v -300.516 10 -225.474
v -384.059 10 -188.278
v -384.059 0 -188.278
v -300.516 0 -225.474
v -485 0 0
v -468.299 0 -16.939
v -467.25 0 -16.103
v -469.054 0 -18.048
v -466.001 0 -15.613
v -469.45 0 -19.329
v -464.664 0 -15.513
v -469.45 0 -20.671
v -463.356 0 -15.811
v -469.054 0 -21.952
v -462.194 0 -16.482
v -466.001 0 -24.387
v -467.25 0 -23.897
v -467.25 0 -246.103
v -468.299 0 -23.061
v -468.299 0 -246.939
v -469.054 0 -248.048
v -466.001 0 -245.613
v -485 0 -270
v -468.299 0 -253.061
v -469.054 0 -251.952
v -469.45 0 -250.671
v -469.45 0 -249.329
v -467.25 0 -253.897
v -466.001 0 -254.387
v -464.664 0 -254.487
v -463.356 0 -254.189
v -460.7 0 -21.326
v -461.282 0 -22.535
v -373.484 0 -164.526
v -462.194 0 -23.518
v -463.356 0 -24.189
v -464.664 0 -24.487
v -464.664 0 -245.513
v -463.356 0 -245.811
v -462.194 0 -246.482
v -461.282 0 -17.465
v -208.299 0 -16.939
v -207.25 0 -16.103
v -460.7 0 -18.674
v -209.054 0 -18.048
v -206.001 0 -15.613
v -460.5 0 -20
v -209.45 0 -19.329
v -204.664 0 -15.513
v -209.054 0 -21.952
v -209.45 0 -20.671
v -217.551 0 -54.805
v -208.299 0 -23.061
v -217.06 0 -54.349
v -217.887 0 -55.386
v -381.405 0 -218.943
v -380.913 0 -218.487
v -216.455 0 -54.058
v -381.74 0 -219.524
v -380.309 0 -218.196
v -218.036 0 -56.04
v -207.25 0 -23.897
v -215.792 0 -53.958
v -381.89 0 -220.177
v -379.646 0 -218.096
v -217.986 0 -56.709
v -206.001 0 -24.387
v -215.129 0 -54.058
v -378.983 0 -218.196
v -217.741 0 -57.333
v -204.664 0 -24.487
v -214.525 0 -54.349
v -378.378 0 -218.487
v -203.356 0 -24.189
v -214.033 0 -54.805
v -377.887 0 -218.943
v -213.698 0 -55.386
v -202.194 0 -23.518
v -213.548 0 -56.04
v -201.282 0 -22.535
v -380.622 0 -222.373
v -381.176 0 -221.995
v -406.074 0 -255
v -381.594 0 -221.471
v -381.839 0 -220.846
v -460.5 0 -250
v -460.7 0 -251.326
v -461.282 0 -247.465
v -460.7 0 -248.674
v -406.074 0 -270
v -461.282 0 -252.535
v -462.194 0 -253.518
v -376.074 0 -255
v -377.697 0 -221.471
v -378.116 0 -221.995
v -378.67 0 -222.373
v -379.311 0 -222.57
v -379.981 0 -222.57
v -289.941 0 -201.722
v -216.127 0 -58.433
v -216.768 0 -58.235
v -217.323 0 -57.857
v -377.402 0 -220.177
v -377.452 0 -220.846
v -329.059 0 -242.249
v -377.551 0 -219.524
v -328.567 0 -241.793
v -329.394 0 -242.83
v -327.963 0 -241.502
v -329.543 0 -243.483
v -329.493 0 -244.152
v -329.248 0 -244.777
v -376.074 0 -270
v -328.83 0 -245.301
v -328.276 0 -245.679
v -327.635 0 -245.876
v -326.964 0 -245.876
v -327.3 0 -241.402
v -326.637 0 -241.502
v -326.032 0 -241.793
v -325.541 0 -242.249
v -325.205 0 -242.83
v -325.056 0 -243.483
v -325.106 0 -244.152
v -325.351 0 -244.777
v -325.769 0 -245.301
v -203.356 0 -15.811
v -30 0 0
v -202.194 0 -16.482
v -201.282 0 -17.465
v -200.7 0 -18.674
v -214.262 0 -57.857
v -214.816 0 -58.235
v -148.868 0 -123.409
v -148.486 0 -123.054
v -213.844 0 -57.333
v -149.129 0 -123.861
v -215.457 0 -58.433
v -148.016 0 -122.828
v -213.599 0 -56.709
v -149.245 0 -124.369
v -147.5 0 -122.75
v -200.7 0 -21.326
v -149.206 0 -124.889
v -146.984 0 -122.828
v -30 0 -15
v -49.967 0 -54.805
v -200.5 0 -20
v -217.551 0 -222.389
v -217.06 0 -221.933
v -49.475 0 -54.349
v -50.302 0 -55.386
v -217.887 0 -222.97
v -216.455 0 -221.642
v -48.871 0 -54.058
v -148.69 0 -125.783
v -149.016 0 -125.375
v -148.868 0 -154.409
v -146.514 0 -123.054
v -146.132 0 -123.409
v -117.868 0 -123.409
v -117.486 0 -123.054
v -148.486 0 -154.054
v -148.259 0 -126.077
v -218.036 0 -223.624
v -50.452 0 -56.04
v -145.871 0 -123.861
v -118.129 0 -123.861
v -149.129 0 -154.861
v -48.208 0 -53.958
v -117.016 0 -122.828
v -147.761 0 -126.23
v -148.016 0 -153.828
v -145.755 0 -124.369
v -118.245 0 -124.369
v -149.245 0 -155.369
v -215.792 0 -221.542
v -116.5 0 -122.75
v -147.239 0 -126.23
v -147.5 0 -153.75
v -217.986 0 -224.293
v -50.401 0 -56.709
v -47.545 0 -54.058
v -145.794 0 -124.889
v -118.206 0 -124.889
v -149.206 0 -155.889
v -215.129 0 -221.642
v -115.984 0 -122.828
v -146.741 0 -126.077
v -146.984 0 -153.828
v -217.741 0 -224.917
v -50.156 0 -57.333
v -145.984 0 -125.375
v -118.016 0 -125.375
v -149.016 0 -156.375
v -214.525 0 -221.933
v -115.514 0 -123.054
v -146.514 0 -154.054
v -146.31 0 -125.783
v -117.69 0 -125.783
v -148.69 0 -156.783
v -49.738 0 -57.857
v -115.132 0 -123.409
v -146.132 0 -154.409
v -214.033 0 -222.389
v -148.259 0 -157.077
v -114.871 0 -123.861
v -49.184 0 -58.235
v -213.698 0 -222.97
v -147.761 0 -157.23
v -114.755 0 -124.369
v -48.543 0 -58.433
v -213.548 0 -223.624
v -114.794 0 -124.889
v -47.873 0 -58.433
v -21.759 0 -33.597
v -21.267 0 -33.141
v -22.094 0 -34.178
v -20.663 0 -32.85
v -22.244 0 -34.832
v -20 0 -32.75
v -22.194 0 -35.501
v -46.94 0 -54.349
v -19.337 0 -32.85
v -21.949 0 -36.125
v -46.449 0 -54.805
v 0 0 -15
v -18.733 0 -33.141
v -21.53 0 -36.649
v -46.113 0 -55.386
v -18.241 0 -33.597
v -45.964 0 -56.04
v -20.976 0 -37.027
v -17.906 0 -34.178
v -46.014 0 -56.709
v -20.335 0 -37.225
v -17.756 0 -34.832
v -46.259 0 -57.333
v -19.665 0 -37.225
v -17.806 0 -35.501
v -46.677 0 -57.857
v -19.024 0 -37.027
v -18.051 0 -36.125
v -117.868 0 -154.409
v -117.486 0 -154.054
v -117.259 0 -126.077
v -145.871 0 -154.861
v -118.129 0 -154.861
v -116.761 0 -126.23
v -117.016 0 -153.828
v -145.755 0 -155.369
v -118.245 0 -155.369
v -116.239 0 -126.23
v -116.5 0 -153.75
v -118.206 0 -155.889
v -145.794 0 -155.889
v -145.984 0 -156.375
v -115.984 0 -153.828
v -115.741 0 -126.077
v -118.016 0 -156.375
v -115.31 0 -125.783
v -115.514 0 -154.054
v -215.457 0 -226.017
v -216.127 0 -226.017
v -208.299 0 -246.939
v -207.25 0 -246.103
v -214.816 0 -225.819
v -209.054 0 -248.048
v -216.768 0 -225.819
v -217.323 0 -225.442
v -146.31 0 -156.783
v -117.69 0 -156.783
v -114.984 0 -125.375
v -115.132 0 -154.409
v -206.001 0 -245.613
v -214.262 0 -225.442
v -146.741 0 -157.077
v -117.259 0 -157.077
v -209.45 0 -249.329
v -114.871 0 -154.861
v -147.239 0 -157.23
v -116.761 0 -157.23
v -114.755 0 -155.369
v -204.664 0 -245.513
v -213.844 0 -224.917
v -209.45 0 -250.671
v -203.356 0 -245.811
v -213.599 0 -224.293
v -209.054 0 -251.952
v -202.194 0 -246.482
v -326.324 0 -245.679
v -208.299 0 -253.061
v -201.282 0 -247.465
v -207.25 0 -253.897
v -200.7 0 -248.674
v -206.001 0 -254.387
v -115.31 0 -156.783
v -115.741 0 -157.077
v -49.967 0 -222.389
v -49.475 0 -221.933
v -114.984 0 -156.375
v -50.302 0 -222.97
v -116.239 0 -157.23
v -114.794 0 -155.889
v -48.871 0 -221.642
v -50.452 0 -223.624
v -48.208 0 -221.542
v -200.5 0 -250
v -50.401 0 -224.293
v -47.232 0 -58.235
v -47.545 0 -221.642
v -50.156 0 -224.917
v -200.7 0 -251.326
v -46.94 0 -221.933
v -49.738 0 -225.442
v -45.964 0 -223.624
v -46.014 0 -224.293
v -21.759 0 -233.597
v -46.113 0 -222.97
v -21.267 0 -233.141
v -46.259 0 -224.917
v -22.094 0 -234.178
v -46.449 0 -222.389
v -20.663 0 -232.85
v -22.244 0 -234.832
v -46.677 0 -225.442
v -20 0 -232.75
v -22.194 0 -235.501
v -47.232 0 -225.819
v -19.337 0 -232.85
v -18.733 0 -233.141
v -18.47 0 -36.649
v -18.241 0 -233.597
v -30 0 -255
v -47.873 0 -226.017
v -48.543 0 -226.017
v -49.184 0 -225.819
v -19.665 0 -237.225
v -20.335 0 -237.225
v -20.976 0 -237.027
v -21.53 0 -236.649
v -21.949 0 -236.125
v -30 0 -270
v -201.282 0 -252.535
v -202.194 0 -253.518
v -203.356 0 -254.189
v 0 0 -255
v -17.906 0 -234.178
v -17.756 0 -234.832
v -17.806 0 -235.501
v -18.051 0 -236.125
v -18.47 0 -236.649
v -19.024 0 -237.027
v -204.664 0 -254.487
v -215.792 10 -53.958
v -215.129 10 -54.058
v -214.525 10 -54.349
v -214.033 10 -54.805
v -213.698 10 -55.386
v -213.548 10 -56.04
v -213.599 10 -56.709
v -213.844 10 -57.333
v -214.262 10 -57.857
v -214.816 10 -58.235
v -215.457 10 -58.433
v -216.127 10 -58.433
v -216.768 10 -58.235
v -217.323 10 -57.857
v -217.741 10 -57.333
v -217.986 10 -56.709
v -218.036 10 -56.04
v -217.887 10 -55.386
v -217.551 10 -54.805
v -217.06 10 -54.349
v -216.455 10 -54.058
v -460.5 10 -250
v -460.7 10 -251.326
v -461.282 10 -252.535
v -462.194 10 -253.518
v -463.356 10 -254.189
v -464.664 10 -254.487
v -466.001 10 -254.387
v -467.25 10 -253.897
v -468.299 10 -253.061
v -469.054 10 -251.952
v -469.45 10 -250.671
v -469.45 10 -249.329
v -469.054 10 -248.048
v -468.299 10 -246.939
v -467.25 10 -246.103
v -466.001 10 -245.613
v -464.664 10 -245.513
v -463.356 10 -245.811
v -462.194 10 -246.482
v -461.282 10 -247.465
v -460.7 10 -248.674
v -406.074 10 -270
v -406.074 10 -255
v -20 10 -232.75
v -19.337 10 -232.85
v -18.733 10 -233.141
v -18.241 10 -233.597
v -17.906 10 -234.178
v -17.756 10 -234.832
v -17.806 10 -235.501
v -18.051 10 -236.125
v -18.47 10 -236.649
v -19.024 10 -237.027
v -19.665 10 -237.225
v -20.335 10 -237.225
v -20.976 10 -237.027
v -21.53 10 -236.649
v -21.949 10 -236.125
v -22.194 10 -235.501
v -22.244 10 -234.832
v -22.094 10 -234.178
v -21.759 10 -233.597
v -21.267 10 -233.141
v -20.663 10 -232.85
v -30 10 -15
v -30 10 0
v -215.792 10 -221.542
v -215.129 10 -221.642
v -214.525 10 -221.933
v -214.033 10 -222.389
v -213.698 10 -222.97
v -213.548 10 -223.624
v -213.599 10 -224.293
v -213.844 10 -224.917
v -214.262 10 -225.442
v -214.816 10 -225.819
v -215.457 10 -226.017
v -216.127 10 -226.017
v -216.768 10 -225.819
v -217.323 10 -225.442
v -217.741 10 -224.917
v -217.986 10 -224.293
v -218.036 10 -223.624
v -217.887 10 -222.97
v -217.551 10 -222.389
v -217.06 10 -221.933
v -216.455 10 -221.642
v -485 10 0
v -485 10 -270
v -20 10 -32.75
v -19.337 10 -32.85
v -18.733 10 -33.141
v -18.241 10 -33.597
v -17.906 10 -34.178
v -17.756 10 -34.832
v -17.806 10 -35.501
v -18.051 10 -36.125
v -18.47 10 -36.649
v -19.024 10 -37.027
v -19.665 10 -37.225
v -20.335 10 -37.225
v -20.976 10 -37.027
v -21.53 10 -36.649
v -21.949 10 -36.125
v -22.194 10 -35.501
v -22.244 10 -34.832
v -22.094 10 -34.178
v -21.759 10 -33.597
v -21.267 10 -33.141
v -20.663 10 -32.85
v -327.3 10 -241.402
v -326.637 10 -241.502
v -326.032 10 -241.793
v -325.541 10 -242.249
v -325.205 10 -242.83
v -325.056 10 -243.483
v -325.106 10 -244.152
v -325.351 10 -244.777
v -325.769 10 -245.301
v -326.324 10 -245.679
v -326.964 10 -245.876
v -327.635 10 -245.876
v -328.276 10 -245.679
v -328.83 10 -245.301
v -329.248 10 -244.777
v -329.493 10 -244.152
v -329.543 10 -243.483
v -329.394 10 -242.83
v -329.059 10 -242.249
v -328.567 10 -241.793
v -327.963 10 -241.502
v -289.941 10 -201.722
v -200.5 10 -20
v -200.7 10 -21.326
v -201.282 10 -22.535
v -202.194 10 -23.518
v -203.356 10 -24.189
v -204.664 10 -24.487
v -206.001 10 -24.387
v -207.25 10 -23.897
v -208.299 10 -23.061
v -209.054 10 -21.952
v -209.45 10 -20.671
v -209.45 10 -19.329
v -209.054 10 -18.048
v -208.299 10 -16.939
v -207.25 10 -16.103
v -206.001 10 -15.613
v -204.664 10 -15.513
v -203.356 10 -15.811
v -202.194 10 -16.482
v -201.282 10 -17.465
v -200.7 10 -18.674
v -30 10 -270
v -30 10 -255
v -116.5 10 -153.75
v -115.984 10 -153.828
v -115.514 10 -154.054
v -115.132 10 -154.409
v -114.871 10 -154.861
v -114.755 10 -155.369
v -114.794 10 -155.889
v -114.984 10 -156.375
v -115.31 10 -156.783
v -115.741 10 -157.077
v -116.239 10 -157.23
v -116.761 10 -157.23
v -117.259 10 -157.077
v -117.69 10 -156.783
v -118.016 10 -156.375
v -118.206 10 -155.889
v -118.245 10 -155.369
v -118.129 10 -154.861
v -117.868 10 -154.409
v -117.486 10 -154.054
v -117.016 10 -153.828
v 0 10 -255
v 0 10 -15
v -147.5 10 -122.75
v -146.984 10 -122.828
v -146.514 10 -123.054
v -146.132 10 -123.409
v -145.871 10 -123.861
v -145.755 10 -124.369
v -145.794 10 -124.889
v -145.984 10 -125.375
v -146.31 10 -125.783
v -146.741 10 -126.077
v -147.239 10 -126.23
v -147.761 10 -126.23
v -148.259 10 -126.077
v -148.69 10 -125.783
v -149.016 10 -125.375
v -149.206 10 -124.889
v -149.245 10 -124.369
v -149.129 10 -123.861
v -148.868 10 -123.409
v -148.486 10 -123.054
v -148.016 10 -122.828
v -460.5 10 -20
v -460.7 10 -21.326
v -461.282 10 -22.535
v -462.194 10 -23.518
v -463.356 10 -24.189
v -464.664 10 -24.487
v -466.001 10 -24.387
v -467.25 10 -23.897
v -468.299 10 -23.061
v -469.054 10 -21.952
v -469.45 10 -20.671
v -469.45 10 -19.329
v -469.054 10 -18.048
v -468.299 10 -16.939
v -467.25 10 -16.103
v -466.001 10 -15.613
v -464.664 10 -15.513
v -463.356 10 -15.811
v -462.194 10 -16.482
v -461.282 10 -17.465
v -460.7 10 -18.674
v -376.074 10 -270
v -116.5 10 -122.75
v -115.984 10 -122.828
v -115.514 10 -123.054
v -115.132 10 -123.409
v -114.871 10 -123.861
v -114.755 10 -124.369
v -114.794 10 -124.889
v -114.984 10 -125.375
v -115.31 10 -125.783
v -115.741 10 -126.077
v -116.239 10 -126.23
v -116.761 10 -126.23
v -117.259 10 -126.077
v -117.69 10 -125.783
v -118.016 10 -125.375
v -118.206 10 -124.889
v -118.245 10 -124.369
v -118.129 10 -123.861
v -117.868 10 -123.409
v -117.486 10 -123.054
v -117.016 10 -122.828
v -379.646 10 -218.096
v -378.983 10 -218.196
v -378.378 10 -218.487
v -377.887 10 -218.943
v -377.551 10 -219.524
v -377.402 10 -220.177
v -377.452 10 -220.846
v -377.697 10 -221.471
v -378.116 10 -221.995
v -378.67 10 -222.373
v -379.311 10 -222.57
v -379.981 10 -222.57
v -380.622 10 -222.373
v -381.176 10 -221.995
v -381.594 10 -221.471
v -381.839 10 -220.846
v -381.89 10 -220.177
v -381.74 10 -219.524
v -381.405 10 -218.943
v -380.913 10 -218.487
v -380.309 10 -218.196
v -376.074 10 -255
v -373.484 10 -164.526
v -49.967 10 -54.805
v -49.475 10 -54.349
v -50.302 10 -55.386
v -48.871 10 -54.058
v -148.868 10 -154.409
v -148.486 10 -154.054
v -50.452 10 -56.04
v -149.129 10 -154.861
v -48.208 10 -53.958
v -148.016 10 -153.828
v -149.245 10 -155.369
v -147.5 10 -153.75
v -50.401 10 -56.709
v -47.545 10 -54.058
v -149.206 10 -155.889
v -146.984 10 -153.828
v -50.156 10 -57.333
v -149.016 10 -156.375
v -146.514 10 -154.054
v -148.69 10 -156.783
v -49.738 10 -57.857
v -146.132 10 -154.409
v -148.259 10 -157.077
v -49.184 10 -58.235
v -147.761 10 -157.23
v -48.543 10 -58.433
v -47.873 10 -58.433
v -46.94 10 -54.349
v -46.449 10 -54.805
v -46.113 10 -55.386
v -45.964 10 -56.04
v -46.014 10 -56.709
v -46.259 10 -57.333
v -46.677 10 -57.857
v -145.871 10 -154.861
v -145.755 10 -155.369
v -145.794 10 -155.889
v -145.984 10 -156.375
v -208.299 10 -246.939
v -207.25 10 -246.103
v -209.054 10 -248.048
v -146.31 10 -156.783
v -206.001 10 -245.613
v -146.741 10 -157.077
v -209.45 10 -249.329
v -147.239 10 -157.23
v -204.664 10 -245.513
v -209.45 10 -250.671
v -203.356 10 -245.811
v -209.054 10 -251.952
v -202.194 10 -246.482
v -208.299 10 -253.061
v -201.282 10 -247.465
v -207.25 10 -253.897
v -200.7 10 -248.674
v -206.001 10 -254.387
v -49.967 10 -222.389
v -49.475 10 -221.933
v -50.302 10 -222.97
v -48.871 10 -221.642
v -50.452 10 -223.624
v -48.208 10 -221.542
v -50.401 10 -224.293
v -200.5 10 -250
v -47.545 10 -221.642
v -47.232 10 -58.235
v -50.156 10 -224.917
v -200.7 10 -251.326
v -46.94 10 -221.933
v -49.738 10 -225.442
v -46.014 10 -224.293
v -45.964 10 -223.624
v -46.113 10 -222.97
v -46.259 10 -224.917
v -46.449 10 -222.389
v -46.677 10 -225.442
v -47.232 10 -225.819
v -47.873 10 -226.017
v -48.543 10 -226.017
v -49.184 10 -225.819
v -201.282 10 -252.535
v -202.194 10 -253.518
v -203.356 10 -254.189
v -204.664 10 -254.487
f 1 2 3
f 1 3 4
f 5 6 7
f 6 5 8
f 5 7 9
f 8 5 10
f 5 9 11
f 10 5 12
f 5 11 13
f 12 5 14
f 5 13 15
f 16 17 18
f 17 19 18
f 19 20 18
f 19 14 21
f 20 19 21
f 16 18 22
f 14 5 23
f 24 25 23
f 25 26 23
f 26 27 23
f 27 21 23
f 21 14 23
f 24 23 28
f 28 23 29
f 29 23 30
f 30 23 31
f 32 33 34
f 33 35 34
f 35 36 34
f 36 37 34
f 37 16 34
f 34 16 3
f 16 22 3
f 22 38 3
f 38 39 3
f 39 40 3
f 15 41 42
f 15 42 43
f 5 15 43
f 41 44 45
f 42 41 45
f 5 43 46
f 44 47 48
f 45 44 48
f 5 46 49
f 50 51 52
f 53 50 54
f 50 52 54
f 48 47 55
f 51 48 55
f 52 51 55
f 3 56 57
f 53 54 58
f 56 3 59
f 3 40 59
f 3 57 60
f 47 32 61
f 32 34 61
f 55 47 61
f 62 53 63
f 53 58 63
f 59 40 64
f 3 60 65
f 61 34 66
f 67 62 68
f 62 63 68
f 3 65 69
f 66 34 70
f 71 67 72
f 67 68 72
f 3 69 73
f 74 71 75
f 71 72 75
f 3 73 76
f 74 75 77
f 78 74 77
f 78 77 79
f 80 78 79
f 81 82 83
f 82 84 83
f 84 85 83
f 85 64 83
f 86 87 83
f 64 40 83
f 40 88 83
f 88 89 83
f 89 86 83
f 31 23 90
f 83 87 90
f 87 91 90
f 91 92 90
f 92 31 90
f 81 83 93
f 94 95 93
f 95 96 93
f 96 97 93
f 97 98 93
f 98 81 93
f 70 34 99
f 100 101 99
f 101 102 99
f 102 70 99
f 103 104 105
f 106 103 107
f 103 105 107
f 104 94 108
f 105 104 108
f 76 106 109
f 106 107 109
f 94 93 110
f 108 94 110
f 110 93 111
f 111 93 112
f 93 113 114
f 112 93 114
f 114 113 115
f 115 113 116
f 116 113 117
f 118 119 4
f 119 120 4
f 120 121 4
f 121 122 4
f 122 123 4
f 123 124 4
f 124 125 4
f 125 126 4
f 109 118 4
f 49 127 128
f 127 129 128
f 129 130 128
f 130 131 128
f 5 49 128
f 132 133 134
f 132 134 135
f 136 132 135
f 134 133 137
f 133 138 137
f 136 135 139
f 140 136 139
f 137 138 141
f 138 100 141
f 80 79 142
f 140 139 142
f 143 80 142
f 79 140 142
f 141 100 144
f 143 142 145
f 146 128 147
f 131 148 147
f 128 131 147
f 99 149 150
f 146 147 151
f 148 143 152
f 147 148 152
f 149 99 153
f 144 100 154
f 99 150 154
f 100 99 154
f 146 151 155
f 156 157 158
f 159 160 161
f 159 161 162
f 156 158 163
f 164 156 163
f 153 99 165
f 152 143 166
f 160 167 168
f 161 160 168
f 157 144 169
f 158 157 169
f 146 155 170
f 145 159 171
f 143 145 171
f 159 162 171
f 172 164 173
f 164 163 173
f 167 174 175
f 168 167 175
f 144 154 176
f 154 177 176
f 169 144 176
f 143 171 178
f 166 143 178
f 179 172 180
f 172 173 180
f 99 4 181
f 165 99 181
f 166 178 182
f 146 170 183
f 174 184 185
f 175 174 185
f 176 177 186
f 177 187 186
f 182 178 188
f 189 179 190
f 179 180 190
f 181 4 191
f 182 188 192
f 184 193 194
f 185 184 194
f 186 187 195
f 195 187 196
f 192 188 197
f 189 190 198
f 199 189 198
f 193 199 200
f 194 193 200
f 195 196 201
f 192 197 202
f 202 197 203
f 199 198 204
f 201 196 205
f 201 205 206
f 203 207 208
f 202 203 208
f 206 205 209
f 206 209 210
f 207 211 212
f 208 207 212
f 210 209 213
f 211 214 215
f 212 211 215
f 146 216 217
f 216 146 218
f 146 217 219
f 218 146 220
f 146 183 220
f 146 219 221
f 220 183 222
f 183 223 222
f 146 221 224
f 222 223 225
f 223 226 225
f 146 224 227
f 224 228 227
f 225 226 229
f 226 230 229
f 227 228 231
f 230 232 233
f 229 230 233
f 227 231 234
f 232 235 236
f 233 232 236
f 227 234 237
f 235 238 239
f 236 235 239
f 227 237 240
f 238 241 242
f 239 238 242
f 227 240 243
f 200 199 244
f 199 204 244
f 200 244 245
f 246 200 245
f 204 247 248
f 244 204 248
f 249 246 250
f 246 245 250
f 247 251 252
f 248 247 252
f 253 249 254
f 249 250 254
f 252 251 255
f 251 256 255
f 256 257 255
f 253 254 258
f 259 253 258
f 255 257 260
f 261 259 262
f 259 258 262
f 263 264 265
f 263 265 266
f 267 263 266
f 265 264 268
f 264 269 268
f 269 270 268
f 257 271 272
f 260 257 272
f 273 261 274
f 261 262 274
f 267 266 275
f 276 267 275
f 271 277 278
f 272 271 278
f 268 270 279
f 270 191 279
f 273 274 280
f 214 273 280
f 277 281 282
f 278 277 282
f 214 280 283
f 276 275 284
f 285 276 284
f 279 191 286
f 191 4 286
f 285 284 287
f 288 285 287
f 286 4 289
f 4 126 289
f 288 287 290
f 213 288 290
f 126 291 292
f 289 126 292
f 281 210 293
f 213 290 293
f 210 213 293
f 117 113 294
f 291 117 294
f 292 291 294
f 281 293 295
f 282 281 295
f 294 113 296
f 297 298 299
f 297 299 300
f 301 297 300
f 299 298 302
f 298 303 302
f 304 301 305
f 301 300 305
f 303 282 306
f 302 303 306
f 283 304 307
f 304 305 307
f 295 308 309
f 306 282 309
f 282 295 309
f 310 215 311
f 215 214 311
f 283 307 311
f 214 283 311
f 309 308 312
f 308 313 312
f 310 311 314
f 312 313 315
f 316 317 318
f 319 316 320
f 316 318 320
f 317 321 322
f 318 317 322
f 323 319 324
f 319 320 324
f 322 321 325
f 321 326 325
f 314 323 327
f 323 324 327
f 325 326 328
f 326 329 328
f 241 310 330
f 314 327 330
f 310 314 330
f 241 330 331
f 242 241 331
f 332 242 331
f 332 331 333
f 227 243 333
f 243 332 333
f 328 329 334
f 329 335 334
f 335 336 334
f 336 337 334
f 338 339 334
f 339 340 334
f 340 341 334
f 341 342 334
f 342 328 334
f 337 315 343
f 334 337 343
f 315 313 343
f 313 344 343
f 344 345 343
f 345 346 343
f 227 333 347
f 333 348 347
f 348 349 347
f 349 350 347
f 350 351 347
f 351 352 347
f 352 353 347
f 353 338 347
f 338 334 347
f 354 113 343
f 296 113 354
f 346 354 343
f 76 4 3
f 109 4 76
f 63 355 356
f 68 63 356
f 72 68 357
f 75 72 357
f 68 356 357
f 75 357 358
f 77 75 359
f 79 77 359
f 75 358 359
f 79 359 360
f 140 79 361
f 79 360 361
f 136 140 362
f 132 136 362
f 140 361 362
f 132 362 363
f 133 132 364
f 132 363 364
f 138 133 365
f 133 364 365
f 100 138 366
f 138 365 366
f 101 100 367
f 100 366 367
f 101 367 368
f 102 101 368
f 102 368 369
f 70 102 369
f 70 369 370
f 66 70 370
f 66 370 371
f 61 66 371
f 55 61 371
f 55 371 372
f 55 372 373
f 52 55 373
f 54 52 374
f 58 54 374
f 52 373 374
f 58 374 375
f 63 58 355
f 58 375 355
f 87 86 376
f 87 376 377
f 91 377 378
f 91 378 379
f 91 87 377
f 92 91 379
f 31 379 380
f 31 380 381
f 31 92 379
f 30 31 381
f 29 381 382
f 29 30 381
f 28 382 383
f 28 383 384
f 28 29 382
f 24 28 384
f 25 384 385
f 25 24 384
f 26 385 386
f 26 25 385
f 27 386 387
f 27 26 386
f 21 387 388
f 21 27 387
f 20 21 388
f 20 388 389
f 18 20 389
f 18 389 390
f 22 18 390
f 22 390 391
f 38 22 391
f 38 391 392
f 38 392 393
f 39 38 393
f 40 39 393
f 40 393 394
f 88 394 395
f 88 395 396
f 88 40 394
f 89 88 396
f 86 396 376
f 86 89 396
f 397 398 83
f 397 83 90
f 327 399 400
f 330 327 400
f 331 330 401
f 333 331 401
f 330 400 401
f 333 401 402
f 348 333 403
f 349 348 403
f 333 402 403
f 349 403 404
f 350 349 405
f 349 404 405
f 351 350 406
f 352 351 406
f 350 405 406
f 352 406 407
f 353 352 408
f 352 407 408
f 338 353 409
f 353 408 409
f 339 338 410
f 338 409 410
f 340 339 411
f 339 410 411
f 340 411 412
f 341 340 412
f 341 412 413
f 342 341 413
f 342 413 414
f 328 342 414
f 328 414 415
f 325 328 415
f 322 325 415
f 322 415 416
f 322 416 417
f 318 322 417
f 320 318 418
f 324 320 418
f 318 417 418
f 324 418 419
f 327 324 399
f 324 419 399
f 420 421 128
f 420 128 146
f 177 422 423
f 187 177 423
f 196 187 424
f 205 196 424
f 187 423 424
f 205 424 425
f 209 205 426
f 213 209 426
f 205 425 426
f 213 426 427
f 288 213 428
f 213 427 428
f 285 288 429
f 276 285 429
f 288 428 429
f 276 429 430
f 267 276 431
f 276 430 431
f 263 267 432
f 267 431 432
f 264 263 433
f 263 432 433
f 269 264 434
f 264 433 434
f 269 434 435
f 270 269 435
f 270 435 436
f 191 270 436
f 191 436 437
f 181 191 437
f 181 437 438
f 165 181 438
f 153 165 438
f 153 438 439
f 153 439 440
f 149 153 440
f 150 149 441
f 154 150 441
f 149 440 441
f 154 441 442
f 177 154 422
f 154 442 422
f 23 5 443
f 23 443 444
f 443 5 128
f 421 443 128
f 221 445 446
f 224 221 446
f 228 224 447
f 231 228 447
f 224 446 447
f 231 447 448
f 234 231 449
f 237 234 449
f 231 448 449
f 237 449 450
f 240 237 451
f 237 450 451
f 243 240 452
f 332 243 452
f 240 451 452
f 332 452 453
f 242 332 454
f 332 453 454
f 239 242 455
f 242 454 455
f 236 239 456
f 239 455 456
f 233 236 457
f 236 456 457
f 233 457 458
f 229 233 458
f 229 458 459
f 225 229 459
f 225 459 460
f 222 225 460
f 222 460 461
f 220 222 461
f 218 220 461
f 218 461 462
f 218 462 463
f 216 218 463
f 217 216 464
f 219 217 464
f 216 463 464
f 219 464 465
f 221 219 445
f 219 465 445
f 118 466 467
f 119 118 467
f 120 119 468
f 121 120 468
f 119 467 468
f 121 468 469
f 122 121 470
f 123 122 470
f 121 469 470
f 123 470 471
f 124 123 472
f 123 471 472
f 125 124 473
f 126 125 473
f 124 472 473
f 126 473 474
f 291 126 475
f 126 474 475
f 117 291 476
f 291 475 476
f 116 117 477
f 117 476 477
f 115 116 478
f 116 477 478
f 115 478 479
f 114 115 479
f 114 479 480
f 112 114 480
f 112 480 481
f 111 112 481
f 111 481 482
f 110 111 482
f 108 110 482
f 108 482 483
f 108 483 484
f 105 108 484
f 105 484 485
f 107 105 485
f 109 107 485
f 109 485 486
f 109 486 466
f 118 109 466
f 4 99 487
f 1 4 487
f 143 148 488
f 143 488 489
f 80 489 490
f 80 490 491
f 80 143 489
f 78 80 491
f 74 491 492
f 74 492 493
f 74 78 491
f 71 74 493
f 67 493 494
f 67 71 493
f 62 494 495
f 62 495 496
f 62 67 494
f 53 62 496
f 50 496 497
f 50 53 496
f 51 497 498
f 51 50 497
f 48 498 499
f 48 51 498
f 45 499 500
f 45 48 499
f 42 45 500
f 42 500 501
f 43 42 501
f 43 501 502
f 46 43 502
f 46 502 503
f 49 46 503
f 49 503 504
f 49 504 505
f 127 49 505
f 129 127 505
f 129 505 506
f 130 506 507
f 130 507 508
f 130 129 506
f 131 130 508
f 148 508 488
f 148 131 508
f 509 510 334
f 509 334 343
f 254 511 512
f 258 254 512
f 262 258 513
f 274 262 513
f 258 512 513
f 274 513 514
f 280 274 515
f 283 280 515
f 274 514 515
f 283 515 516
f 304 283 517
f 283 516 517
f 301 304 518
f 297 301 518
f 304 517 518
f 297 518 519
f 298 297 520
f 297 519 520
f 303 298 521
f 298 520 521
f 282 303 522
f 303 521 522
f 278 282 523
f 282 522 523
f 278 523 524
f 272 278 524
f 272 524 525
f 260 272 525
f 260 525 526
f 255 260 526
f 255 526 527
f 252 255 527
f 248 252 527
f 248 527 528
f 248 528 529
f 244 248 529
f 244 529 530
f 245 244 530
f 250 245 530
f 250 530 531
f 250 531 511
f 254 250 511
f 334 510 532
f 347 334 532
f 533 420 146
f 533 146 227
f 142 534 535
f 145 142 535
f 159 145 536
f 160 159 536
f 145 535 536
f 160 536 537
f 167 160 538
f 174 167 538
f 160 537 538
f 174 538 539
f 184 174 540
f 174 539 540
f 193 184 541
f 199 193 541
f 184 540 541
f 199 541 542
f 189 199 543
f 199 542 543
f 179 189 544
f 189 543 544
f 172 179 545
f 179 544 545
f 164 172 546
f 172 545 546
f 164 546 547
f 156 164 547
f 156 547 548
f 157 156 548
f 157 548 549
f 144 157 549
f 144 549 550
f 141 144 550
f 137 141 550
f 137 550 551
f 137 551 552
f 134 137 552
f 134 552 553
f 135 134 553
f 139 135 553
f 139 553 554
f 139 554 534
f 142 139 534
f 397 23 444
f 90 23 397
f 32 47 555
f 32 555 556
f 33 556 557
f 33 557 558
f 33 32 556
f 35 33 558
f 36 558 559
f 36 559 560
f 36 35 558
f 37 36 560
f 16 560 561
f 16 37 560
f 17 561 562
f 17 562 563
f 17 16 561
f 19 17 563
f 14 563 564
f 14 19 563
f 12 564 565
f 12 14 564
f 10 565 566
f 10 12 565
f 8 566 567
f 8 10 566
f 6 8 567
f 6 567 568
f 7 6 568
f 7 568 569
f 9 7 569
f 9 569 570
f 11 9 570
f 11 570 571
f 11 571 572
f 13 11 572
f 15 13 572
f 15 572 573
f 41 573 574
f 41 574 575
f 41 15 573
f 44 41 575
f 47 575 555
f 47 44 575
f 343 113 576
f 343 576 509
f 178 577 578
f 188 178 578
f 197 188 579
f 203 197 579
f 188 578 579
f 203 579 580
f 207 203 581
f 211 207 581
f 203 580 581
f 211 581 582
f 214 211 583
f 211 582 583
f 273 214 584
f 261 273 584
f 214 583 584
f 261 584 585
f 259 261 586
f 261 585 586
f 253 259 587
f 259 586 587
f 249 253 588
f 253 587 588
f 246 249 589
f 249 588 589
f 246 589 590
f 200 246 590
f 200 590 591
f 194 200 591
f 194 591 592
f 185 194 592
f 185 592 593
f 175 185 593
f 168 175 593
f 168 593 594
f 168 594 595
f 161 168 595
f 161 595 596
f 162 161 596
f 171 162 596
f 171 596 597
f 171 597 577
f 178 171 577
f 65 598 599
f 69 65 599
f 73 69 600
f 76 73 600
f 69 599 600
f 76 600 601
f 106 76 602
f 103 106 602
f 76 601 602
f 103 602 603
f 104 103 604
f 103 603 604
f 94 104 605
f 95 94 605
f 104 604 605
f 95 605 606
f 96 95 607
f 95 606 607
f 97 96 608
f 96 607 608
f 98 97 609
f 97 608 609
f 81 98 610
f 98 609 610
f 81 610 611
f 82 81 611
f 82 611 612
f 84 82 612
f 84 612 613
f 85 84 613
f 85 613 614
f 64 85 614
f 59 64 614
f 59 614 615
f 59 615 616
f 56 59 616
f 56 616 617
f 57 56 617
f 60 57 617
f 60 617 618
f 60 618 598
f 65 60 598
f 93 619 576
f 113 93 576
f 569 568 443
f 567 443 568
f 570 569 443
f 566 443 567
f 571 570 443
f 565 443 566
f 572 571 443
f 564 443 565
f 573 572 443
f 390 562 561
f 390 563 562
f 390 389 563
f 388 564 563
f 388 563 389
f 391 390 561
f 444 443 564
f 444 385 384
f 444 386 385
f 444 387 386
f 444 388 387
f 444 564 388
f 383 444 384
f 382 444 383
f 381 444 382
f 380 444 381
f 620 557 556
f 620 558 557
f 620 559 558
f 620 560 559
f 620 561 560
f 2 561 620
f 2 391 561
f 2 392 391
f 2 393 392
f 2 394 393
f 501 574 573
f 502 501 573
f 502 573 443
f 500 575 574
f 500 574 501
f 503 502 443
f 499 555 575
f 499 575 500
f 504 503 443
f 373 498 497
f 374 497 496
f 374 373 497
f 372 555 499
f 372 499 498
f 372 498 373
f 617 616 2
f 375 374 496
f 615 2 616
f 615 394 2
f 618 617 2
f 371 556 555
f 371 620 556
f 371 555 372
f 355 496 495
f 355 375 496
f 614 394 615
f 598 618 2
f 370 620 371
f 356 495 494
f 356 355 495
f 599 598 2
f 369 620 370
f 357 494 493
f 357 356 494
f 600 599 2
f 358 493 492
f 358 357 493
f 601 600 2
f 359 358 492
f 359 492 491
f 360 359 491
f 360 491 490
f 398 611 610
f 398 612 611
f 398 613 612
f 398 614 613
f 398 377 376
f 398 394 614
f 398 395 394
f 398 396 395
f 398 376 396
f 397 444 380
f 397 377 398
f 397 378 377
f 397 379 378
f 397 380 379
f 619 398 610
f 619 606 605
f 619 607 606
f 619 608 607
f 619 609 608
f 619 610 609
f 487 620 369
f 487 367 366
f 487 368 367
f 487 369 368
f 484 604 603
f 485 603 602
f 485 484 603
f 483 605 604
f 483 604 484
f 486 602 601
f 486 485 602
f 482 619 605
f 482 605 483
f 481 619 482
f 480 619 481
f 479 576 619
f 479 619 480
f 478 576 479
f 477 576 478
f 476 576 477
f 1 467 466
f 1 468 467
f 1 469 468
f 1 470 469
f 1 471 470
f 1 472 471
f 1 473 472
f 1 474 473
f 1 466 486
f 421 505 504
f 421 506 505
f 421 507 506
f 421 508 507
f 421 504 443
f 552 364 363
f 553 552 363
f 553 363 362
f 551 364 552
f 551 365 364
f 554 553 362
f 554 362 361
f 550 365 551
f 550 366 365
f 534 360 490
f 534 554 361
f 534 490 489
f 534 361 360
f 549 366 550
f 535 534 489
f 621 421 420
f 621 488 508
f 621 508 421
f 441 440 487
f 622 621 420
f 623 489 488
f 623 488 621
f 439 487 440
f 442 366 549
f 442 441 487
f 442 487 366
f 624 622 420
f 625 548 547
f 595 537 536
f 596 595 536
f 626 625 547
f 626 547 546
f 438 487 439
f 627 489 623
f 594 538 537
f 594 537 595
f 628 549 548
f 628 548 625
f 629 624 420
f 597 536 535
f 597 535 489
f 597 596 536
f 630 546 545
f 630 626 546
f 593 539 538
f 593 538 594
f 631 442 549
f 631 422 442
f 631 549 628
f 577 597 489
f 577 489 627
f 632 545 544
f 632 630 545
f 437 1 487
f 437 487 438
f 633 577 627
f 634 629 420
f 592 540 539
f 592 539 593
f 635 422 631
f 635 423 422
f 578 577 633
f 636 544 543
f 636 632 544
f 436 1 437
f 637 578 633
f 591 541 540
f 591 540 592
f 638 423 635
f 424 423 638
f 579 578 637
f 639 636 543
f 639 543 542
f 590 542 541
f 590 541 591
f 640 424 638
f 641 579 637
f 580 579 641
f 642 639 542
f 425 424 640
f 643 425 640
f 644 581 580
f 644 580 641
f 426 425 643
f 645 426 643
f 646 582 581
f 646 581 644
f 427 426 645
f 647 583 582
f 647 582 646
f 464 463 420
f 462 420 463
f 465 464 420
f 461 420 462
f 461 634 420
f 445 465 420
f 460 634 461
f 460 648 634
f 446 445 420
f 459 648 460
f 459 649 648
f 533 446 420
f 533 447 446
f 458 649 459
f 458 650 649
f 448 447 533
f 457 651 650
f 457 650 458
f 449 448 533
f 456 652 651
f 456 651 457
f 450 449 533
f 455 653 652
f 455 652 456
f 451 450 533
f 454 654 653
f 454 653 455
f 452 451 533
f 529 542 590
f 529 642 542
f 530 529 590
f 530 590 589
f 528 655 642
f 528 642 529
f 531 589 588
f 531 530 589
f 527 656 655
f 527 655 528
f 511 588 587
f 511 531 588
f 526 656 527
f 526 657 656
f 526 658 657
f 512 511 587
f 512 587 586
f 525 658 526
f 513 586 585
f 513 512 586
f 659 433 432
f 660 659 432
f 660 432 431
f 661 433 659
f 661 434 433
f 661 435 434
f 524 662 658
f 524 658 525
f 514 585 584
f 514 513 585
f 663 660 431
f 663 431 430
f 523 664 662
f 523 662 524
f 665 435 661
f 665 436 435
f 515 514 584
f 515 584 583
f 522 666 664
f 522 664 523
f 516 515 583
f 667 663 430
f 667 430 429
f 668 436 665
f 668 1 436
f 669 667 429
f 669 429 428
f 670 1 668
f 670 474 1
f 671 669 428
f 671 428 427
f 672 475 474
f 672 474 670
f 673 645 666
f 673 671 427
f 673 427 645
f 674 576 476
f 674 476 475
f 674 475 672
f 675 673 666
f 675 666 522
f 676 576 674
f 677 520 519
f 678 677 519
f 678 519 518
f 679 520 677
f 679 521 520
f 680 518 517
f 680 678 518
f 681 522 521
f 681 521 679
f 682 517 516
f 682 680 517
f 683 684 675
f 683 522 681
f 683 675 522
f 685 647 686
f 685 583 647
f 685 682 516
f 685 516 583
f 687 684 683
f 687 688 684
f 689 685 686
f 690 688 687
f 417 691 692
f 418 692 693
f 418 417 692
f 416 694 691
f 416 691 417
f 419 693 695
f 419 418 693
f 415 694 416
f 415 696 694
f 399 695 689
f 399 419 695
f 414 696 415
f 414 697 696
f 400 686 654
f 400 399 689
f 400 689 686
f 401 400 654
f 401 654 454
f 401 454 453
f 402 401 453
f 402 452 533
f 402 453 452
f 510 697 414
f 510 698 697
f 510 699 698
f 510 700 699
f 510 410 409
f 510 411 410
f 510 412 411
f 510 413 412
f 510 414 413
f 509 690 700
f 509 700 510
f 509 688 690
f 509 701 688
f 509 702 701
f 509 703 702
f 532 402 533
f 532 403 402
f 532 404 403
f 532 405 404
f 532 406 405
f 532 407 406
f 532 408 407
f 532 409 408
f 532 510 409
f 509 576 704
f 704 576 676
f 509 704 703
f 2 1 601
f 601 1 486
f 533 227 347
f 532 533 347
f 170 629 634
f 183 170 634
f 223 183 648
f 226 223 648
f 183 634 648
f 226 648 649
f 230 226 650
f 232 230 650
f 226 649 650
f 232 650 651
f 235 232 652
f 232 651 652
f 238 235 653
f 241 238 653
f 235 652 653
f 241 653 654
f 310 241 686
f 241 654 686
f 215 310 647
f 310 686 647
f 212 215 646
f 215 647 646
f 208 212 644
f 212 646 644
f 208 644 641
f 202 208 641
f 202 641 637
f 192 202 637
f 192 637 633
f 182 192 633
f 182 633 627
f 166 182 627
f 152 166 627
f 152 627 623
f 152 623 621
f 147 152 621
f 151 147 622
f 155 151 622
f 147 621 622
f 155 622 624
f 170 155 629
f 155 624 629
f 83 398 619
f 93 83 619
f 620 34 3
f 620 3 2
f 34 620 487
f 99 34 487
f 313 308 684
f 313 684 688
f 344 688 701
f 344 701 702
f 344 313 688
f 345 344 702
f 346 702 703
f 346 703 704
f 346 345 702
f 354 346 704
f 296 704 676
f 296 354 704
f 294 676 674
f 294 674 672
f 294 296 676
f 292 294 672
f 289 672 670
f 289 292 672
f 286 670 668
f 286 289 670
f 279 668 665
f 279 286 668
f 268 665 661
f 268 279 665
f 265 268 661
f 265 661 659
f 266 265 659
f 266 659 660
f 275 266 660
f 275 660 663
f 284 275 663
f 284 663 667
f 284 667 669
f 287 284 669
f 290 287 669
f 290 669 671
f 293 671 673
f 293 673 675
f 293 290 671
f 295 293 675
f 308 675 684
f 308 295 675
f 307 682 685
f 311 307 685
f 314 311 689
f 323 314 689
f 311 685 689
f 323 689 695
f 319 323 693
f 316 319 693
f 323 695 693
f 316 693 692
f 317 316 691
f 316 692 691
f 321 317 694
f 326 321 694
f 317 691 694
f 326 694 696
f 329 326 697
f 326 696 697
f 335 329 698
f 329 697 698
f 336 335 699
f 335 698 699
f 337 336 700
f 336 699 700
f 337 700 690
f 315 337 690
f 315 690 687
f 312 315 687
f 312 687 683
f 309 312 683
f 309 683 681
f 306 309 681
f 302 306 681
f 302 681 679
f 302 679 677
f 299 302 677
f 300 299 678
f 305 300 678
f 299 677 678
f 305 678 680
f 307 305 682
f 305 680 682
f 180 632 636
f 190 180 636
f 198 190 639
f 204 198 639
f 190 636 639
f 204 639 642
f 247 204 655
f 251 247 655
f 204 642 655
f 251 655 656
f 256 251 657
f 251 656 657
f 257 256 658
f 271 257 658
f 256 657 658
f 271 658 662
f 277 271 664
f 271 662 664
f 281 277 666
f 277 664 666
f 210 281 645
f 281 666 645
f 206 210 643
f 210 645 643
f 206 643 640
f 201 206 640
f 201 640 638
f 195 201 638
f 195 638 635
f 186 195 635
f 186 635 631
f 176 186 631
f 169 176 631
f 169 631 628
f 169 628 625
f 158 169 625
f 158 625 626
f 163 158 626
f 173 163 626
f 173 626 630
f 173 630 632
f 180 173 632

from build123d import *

# Parameters (mm, degrees)
SCHIZZO1_W                    = 485
SCHIZZO1_H                    = 270
ESTRUSIONE_ESTRUSIONE1_DEPTH  = 10
FORO_PER_VITE_M8_1_OUTLINE_R  = 4.5
FORO_PER_VITE_M8_1_DEPTH      = 10
TAGLIO_ESTRUSIONE1_DEPTH      = 13
TAGLIO_ESTRUSIONE1_DEPTH_BACK = 13
SCHIZZO5_W                    = 91.448812178
SCHIZZO5_H                    = 10
SCHIZZO6_R                    = 2.25
TAGLIO_ESTRUSIONE2_DEPTH      = 10
SCHIZZO7_R                    = 1.75
TAGLIO_ESTRUSIONE3_DEPTH      = 15
SCHIZZO8_R                    = 2.25
TAGLIO_ESTRUSIONE4_DEPTH      = 42.3
SCHIZZO9_W                    = 30
SCHIZZO9_H                    = 15
TAGLIO_ESTRUSIONE5_DEPTH      = 10
SCHIZZO10_R                   = 2.25
TAGLIO_ESTRUSIONE6_DEPTH      = 10


# Read off the part's stored shape, not the designer's step: Foro per Vite M8-1
with BuildPart() as part:
    # Schizzo1 → Estrusione-Estrusione1 (new body)
    with BuildSketch(Plane(origin=(0, 0, 0), x_dir=(1, 0, 0), z_dir=(0, 1, 0))):
        with Locations((-242.5, 135)):
            Rectangle(SCHIZZO1_W, SCHIZZO1_H)
    extrude(amount=ESTRUSIONE_ESTRUSIONE1_DEPTH)

    # Foro per Vite M8-1 outline → Foro per Vite M8-1 (cut)
    with BuildSketch(Plane(origin=(0, 0, 0), x_dir=(1, 0, 0), z_dir=(0, 1, 0))):
        with Locations((-205, 250)):
            Circle(FORO_PER_VITE_M8_1_OUTLINE_R)
        with Locations((-465, 20)):
            Circle(FORO_PER_VITE_M8_1_OUTLINE_R)
        with Locations((-205, 20)):
            Circle(FORO_PER_VITE_M8_1_OUTLINE_R)
        with Locations((-465, 250)):
            Circle(FORO_PER_VITE_M8_1_OUTLINE_R)
    extrude(amount=FORO_PER_VITE_M8_1_DEPTH, mode=Mode.SUBTRACT)

    # Schizzo5 → Taglio-Estrusione1 (cut, two sides: drawn at the far end of the back side and taken through both)
    with BuildSketch(Plane(origin=(-128.208113313, 0, -287.960137213), x_dir=(0.9135454576425992, 0, -0.4067366430758042), z_dir=(0.4067366430758042, 0, 0.9135454576425992)).offset(-TAGLIO_ESTRUSIONE1_DEPTH_BACK)):
        with Locations((-228.551173826, 5)):
            Rectangle(SCHIZZO5_W, SCHIZZO5_H)
    extrude(amount=TAGLIO_ESTRUSIONE1_DEPTH + TAGLIO_ESTRUSIONE1_DEPTH_BACK, mode=Mode.SUBTRACT)

    # Schizzo6 → Taglio-Estrusione2 (cut)
    with BuildSketch(Plane(origin=(0, 10, 0), x_dir=(1, 0, 0), z_dir=(0, 1, 0))):
        with Locations(Location((-48.207846429, 223.792153571, 0), (0, 0, 270))):
            Circle(SCHIZZO6_R)
        with Locations(Location((-215.792153571, 223.792153571, 0), (0, 0, 270))):
            Circle(SCHIZZO6_R)
        with Locations(Location((-215.792153571, 56.207846429, 0), (0, 0, 270))):
            Circle(SCHIZZO6_R)
        with Locations(Location((-48.207846429, 56.207846429, 0), (0, 0, 270))):
            Circle(SCHIZZO6_R)
    extrude(amount=-TAGLIO_ESTRUSIONE2_DEPTH, mode=Mode.SUBTRACT)

    # Schizzo7 → Taglio-Estrusione3 (cut)
    with BuildSketch(Plane(origin=(0, 10, 0), x_dir=(1, 0, 0), z_dir=(0, 1, 0))):
        with Locations(Location((-147.5, 155.5, 0), (0, 0, 270))):
            Circle(SCHIZZO7_R)
        with Locations(Location((-116.5, 155.5, 0), (0, 0, 270))):
            Circle(SCHIZZO7_R)
        with Locations(Location((-116.5, 124.5, 0), (0, 0, 270))):
            Circle(SCHIZZO7_R)
        with Locations(Location((-147.5, 124.5, 0), (0, 0, 270))):
            Circle(SCHIZZO7_R)
    extrude(amount=-TAGLIO_ESTRUSIONE3_DEPTH, mode=Mode.SUBTRACT)

    # Schizzo8 → Taglio-Estrusione4 (cut)
    with BuildSketch(Plane(origin=(0, 10, 0), x_dir=(1, 0, 0), z_dir=(0, 1, 0))):
        with Locations(Location((-327.299756602, 243.651595895, 0), (0, 0, 270))):
            Circle(SCHIZZO8_R)
        with Locations(Location((-379.645911325, 220.345586247, 0), (0, 0, 270))):
            Circle(SCHIZZO8_R)
    extrude(amount=-TAGLIO_ESTRUSIONE4_DEPTH, mode=Mode.SUBTRACT)

    # Schizzo9 → Taglio-Estrusione5 (cut)
    with BuildSketch(Plane(origin=(0, 10, 0), x_dir=(1, 0, 0), z_dir=(0, 1, 0))):
        with Locations((-15, 262.5)):
            Rectangle(SCHIZZO9_W, SCHIZZO9_H)
        with Locations((-15, 7.5)):
            Rectangle(SCHIZZO9_W, SCHIZZO9_H)
        with Locations((-391.074312, 262.5)):
            Rectangle(SCHIZZO9_W, SCHIZZO9_H)
    extrude(amount=-TAGLIO_ESTRUSIONE5_DEPTH, mode=Mode.SUBTRACT)

    # Schizzo10 → Taglio-Estrusione6 (cut)
    with BuildSketch(Plane(origin=(0, 10, 0), x_dir=(1, 0, 0), z_dir=(0, 1, 0))):
        with Locations(Location((-20, 35, 0), (0, 0, 270))):
            Circle(SCHIZZO10_R)
        with Locations(Location((-20, 235, 0), (0, 0, 270))):
            Circle(SCHIZZO10_R)
    extrude(amount=-TAGLIO_ESTRUSIONE6_DEPTH, mode=Mode.SUBTRACT)


solid = part.part
